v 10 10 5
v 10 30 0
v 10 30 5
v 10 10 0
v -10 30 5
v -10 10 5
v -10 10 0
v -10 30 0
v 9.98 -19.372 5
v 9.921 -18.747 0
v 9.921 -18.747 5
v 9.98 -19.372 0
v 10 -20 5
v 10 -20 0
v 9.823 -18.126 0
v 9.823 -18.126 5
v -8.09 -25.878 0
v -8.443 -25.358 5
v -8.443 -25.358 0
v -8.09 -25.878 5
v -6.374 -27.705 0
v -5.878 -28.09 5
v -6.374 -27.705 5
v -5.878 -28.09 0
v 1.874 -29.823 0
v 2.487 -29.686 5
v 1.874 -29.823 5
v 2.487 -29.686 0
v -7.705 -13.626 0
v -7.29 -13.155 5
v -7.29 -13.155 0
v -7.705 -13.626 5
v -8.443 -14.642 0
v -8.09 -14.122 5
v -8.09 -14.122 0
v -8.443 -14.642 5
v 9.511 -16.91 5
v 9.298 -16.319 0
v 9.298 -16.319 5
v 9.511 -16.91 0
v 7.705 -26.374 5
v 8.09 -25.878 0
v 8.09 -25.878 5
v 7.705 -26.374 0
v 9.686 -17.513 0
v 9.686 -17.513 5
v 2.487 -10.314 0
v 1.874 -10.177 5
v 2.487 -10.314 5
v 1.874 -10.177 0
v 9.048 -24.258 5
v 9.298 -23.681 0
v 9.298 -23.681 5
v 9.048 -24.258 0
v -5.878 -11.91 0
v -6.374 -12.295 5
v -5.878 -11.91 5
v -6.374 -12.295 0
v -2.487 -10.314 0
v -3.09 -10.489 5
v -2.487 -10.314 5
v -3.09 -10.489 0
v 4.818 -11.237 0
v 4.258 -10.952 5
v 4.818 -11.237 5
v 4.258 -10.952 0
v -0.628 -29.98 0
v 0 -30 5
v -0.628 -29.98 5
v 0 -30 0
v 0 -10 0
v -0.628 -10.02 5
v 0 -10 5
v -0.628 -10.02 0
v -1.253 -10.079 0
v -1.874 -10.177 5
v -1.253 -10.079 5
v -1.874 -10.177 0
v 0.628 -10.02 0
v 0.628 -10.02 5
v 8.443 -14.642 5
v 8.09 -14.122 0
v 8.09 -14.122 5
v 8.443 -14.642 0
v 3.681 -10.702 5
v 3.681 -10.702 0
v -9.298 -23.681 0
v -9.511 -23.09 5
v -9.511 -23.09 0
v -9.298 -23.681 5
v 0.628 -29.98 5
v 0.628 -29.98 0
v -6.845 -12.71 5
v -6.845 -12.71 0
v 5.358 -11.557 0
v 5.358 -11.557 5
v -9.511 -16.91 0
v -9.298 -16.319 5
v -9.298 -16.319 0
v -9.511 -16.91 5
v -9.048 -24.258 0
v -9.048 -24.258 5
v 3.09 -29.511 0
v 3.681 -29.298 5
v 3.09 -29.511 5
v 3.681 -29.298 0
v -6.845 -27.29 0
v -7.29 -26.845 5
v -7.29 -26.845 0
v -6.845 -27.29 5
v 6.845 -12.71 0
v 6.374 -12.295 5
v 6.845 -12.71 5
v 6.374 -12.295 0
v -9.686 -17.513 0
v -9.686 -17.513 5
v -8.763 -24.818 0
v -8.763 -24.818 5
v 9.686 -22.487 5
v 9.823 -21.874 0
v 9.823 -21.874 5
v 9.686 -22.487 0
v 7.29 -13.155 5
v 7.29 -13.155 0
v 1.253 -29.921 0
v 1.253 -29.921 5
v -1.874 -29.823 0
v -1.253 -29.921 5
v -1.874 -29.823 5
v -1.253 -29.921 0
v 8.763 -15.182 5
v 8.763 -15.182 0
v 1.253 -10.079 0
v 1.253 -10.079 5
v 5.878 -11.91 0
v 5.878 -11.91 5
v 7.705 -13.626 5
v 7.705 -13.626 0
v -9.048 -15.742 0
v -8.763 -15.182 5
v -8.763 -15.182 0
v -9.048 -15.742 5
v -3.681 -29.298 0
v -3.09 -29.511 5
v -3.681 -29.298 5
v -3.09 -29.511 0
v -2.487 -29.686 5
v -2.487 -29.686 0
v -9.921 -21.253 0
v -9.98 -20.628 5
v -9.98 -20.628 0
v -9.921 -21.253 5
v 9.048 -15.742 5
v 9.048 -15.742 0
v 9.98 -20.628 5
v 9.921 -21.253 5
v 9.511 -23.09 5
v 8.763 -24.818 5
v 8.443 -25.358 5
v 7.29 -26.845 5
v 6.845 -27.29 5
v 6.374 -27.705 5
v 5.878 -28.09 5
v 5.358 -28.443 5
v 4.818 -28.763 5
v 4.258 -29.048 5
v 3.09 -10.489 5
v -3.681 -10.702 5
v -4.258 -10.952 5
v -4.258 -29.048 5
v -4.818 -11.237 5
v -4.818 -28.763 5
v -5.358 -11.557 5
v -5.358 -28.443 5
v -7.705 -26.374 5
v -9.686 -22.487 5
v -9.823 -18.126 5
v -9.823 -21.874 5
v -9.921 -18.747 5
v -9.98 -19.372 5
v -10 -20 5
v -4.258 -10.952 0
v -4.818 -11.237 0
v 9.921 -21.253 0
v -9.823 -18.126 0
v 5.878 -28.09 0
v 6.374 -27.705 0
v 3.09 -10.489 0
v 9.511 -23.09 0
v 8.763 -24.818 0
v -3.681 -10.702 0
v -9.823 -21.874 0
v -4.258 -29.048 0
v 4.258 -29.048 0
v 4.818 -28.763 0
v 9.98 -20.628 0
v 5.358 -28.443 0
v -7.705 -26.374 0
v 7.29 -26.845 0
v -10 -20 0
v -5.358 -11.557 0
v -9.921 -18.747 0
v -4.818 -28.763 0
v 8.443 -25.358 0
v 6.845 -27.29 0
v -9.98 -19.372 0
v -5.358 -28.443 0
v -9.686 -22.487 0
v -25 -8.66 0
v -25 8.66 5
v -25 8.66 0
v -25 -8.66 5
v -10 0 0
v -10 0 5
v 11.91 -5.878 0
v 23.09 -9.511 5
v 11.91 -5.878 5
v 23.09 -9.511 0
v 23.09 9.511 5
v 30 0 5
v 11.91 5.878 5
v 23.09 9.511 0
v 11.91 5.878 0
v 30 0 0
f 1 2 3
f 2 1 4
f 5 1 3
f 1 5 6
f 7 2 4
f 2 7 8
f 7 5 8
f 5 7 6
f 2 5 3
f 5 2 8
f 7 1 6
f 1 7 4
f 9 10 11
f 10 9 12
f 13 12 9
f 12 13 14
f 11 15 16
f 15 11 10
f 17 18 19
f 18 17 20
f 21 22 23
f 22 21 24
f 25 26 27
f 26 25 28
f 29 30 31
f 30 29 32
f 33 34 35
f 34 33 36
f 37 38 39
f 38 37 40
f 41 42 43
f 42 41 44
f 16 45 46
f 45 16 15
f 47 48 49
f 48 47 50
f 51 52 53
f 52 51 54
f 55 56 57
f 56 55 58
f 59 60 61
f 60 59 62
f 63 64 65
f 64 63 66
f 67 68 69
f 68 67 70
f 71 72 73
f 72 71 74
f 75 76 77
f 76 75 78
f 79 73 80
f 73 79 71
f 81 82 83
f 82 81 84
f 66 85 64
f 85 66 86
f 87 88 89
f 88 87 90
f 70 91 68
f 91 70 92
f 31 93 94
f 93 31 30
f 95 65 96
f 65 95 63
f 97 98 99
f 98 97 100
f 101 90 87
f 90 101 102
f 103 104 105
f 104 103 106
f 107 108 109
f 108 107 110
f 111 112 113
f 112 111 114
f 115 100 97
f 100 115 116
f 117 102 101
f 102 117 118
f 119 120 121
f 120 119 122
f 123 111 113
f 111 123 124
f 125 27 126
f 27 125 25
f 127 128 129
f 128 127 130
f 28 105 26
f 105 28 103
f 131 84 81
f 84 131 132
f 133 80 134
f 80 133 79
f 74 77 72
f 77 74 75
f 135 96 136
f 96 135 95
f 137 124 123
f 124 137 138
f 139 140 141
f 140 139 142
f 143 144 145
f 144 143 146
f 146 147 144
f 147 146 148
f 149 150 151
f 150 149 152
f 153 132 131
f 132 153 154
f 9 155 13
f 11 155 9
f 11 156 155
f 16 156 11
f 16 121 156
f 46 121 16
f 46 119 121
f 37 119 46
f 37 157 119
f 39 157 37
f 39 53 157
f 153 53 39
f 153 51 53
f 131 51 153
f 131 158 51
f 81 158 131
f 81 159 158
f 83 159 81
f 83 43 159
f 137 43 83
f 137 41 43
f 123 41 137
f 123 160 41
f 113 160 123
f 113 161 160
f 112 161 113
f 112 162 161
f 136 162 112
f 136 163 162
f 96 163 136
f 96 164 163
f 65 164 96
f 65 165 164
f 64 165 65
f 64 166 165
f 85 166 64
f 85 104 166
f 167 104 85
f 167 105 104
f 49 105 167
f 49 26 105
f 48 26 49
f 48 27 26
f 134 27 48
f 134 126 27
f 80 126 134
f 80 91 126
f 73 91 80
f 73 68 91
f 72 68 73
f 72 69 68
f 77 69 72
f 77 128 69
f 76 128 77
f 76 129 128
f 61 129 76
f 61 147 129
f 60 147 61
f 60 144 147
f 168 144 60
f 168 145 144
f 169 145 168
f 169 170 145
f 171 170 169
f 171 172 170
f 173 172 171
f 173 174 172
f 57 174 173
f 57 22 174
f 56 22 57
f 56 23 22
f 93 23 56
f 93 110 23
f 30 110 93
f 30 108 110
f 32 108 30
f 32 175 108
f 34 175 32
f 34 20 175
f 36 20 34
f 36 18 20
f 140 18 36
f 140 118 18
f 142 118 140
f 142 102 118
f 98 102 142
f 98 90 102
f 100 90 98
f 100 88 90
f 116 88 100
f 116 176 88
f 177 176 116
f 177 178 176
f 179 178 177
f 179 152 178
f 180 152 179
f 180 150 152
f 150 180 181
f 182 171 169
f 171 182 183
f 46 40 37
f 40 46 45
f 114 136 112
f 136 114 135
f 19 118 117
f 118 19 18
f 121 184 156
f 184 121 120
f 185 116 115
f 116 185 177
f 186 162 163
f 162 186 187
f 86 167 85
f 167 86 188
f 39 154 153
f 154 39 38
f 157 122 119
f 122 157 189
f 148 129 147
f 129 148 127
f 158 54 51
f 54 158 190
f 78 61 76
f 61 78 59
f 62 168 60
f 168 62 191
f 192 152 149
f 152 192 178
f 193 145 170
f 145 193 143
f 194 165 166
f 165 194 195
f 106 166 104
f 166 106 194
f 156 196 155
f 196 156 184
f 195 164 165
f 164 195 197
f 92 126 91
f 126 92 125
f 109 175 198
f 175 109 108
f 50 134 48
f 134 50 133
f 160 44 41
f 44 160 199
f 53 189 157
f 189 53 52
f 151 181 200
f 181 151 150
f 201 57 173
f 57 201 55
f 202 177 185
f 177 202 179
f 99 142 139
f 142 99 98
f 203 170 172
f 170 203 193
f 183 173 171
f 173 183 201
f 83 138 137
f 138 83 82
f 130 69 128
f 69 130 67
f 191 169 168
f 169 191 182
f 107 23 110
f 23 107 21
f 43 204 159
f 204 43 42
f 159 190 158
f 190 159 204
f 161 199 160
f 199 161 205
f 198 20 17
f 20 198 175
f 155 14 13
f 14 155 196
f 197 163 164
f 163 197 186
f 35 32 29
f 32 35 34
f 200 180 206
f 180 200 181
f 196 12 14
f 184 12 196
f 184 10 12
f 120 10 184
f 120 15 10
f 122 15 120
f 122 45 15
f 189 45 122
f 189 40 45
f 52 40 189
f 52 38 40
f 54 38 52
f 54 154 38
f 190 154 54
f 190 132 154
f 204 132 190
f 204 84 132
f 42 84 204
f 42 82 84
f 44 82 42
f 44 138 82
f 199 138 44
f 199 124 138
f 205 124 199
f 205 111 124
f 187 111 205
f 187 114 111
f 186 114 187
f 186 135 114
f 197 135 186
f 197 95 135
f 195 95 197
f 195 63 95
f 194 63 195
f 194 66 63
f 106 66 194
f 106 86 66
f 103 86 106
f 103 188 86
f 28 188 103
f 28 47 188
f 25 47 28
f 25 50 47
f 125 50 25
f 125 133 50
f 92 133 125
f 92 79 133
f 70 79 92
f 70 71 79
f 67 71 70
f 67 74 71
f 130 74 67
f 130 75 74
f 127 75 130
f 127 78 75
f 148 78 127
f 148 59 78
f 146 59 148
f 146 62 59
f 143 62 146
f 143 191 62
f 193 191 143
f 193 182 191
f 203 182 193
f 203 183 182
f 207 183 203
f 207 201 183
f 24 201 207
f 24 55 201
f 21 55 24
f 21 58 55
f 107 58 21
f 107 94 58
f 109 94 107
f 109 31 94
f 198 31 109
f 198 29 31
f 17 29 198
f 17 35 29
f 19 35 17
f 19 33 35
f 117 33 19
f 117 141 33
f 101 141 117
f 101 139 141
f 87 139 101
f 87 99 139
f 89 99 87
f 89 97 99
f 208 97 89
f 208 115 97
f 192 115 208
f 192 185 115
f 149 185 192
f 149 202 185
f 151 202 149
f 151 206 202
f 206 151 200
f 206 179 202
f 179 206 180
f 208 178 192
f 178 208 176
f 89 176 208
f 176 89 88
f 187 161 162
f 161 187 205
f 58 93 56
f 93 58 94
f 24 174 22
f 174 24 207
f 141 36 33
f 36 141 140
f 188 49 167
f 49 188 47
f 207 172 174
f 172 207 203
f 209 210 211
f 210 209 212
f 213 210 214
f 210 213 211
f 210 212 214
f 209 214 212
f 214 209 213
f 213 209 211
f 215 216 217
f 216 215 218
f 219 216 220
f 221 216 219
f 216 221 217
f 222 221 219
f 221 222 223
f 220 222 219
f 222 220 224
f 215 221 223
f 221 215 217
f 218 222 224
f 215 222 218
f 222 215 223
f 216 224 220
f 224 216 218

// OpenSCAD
/*  Ejemplos OpenSCAD
    www.automatismos-mdq.com.ar
*/

// dibujar un cubo
translate([-10,10,0])
cube([20,20,5]);

// dibujar un cilindro
translate([0,-20,0])
cylinder(r=10, h=5, $fn=100);

// dibujar un triangulo
translate([-20,0,0])
cylinder(r=10, h=5, $fn=3);

// dibujar un pentagono
translate([20,0,0])
cylinder(r=10, h=5, $fn=5);
